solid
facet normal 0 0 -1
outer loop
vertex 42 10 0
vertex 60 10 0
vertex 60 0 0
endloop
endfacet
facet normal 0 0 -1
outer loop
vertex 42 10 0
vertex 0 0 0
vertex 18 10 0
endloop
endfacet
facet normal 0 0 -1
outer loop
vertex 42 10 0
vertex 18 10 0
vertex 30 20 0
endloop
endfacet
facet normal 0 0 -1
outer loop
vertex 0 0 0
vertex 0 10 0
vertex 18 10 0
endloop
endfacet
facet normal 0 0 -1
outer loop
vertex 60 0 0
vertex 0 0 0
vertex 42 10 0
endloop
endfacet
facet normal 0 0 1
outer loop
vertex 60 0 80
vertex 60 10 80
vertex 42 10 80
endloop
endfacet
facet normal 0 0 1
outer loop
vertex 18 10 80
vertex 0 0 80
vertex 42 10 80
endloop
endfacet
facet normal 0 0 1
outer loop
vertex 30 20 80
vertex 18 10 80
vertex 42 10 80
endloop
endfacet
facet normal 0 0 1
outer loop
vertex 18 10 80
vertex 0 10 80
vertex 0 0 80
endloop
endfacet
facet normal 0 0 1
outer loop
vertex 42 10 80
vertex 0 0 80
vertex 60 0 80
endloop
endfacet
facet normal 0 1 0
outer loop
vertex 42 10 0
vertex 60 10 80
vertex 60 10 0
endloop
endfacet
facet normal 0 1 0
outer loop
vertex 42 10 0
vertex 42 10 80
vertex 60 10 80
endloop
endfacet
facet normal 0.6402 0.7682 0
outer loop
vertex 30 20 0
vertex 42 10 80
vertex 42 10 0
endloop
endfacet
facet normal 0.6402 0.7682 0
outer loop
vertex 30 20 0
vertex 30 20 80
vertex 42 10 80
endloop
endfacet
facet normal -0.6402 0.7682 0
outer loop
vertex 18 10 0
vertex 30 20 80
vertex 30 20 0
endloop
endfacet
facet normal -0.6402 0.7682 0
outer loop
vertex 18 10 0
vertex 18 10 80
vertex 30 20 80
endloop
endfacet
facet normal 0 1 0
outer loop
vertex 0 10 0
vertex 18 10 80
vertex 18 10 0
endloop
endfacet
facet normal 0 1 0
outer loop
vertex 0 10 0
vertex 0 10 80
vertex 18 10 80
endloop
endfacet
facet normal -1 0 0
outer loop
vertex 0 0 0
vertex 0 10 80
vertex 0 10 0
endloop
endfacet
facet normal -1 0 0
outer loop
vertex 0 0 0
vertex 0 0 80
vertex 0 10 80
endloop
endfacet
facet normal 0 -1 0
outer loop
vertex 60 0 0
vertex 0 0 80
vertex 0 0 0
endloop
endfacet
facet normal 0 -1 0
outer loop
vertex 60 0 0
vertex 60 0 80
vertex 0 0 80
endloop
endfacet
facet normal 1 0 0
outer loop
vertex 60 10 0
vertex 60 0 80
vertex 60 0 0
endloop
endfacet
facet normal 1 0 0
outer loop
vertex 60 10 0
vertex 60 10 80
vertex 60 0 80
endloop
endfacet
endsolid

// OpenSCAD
$fn = 32;

// ----------------------------------------------------------------------
// V guide rail: vrib, 60 mm wide
// ----------------------------------------------------------------------

// --- parameters (mm) ---
rail_w = 60;              // rail width, X
base_t = 10;              // base plate thickness
v_depth = 10;             // V feature depth / height
v_half_w = 12;            // half width of the V at the base face
plate_t = 80;             // rail length, Z (the extrusion height)

profile = [[0, 0], [60, 0], [60, 10], [42, 10], [30, 20], [18, 10], [0, 10]];  // primary outline, 7 points, counter clockwise

// --- the one profile operation ---
linear_extrude(height = plate_t) polygon(points = profile);
